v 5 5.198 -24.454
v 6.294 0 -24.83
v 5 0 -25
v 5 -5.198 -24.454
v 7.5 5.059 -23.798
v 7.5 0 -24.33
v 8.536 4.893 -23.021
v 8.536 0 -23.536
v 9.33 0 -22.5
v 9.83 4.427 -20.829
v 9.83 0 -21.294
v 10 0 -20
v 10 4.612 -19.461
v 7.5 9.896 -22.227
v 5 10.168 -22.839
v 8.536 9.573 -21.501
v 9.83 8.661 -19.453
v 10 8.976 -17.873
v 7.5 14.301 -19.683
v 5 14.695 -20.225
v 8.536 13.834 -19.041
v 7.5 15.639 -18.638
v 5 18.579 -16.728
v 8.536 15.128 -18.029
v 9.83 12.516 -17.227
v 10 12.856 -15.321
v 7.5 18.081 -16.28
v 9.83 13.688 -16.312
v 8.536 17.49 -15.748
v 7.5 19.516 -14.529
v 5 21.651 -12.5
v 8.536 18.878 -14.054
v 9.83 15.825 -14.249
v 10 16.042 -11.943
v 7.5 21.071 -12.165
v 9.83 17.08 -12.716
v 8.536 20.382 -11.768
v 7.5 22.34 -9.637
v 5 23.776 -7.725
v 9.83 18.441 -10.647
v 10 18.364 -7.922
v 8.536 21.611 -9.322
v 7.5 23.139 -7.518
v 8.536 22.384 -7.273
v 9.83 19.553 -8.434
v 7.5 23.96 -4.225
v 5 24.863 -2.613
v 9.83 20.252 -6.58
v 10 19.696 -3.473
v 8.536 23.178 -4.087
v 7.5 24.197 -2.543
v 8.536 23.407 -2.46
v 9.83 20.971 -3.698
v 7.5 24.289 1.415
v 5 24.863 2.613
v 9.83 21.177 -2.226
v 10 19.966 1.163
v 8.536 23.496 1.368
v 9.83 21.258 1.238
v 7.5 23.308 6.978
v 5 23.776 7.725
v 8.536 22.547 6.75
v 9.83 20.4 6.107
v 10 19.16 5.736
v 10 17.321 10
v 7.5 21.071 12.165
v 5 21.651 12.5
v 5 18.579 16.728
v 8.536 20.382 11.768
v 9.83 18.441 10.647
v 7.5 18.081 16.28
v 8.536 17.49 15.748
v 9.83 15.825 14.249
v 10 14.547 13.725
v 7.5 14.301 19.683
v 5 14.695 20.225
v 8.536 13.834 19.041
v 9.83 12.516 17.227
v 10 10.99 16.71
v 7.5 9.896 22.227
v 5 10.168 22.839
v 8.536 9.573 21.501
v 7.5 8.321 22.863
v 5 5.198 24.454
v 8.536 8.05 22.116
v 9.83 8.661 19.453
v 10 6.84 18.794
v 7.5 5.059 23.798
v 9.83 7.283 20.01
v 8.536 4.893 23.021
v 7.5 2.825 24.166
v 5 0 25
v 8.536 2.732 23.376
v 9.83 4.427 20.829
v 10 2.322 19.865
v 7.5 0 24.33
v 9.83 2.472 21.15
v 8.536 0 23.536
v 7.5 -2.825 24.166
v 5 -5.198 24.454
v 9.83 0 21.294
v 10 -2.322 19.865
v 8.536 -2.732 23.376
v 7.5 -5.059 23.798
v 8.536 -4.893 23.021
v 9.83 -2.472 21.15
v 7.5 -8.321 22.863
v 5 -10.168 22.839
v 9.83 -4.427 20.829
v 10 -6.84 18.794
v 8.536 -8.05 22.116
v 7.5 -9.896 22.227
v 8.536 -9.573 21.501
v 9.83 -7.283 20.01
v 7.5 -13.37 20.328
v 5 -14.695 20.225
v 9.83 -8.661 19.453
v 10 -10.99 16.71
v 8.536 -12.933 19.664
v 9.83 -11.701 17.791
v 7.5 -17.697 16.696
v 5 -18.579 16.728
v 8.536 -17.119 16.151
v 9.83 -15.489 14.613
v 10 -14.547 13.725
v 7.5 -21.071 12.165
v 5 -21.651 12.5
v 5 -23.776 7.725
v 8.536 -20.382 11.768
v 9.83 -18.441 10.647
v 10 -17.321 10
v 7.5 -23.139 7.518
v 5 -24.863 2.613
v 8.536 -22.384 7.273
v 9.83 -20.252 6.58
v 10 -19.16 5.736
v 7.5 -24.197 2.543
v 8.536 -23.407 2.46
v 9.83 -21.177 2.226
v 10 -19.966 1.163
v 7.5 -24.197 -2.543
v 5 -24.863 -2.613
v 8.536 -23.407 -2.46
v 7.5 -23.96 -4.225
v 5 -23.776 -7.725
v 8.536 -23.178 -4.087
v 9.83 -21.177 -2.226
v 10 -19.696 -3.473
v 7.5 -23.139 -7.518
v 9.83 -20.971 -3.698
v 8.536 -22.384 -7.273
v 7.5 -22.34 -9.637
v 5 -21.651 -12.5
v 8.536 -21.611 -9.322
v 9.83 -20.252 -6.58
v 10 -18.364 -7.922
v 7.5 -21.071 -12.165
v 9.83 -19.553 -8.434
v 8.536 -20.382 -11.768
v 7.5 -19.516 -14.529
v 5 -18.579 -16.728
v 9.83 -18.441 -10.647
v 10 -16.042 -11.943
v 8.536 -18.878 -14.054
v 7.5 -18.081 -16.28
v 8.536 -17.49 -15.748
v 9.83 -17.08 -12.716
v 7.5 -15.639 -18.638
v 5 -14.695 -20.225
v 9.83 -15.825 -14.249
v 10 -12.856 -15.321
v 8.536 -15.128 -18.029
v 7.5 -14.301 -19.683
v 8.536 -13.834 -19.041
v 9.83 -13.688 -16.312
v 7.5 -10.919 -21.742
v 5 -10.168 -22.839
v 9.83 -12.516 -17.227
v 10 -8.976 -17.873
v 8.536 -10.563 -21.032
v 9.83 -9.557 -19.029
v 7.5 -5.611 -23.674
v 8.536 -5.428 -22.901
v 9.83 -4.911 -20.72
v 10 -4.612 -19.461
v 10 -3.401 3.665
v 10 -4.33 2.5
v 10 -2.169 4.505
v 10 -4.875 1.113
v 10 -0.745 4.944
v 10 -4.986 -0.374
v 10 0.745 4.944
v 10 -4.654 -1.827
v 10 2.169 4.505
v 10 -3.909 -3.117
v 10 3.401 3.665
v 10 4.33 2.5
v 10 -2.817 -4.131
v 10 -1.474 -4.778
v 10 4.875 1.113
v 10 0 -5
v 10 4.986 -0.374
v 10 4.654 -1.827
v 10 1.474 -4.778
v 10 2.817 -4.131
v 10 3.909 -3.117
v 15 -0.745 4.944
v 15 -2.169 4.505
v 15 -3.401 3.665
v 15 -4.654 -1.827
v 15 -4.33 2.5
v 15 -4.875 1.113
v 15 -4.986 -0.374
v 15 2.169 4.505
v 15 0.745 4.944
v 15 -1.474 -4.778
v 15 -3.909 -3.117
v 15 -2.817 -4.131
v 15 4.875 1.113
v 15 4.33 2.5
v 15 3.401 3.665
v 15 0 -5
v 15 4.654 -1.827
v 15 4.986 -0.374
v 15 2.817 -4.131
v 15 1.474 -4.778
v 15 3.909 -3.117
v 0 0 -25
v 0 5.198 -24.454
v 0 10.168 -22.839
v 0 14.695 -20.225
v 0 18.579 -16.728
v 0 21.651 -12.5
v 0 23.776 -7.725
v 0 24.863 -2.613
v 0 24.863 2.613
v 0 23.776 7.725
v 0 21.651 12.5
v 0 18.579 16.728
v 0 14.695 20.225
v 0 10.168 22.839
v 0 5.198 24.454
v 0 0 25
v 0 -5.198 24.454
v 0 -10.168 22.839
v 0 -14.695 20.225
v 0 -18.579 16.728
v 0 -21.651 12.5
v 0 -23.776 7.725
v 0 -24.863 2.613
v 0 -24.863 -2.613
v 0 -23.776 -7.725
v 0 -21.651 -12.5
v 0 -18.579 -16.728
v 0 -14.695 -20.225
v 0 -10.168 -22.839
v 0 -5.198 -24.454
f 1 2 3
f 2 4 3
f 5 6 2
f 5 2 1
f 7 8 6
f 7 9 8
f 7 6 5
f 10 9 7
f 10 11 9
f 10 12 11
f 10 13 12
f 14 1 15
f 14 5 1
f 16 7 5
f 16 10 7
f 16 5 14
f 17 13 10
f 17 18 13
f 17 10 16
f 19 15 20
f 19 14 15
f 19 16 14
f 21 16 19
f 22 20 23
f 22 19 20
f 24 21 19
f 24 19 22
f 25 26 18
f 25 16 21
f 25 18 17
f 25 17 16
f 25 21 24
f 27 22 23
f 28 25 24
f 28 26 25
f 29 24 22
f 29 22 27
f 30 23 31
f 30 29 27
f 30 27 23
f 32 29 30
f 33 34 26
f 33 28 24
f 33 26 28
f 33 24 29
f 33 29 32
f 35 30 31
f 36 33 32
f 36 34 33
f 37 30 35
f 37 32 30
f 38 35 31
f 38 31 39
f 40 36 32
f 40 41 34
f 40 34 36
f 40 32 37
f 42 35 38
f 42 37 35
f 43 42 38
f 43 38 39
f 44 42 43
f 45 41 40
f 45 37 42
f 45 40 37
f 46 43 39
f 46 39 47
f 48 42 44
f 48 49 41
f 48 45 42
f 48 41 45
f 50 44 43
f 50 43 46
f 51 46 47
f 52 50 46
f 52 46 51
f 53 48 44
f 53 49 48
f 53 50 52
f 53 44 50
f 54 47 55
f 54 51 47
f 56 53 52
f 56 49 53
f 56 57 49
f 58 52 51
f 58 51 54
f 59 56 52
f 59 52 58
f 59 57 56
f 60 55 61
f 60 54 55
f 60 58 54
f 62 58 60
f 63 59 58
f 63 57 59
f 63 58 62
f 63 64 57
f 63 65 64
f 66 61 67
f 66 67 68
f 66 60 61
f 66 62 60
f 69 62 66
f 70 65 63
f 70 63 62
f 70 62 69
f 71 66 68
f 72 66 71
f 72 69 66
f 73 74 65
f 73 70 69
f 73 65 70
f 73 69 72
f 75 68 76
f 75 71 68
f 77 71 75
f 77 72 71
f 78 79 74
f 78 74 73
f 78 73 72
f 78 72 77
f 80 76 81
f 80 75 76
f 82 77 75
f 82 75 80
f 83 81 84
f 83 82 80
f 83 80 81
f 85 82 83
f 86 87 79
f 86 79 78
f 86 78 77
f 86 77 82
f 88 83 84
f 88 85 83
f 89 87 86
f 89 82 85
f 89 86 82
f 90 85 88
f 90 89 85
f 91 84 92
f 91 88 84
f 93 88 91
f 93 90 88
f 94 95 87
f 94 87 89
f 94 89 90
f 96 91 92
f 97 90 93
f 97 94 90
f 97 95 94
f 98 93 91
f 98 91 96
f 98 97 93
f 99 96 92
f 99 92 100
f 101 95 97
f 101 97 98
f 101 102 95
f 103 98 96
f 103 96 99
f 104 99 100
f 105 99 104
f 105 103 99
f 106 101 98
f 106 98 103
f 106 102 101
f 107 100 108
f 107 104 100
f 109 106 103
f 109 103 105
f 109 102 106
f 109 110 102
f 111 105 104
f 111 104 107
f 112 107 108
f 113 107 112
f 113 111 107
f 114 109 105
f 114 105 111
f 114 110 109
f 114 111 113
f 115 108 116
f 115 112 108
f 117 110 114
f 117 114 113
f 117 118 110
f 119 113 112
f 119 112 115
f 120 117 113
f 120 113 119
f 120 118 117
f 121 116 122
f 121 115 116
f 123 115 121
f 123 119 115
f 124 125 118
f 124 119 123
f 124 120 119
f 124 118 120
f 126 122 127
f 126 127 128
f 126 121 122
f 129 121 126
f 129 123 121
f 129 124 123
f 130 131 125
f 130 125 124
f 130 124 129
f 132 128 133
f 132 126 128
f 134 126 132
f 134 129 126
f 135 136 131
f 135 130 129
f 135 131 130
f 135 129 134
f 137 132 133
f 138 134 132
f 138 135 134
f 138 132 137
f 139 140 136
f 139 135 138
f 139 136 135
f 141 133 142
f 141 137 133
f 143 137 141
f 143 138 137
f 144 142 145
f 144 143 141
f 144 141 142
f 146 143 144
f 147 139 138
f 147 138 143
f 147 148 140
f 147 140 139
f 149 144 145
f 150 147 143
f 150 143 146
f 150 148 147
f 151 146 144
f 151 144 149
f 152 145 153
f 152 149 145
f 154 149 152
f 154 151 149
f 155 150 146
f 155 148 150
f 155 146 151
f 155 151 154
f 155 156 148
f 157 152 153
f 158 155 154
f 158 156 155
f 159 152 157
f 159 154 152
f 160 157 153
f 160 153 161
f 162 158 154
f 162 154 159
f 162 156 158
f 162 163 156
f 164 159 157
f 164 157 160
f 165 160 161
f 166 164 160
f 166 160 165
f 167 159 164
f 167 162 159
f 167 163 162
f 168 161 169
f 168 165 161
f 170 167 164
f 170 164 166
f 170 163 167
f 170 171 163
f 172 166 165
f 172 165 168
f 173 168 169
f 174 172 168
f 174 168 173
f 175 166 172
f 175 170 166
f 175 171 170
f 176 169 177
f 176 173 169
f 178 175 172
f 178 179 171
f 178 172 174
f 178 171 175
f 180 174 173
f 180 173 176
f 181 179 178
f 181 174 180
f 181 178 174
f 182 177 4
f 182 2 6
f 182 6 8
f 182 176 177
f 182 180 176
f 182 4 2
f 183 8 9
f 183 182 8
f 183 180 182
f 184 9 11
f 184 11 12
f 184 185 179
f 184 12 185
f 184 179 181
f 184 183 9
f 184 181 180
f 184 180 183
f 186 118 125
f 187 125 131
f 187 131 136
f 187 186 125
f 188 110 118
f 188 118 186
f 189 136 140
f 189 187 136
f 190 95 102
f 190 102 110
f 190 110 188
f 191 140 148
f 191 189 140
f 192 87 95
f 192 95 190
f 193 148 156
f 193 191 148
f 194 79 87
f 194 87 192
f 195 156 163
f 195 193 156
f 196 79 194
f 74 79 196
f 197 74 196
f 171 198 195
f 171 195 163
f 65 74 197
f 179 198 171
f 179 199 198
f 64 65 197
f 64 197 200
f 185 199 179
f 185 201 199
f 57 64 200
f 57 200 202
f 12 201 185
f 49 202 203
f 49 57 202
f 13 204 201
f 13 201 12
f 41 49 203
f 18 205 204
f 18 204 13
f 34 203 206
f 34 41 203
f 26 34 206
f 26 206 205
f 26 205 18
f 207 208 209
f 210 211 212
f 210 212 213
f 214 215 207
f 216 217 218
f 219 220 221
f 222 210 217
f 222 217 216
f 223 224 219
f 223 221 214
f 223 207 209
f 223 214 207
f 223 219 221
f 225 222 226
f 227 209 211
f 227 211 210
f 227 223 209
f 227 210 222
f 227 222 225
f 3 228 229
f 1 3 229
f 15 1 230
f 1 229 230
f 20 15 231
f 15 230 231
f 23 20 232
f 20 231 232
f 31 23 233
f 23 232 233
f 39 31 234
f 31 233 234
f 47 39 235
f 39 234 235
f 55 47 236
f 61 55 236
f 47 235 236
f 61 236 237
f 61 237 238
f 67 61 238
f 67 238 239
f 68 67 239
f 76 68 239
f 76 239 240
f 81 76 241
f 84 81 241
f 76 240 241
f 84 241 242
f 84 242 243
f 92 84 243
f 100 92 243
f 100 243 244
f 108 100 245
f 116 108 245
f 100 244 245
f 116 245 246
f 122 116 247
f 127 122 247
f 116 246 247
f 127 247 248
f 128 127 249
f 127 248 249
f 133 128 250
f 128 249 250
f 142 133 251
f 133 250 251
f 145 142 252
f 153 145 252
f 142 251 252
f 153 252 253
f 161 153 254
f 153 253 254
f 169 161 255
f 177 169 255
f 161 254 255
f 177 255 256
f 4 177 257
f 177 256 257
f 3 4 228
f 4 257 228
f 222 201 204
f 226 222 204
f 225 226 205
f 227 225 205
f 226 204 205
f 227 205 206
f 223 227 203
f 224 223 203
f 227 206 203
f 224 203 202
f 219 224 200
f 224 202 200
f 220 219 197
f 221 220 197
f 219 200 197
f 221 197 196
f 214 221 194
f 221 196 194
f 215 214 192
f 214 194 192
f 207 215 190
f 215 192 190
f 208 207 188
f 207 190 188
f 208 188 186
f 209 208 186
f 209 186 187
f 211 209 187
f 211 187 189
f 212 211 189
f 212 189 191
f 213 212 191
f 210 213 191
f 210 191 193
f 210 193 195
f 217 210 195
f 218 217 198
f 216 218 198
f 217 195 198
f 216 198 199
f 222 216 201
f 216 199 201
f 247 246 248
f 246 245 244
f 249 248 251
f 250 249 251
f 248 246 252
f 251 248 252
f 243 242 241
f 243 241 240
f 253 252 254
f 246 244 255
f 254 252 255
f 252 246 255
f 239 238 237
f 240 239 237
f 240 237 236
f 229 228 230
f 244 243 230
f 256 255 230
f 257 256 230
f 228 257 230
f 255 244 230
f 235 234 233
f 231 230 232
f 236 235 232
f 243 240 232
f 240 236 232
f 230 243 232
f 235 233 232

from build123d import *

# Parameters (mm, degrees)
SKETCH1_R           = 25
BOSS_EXTRUDE1_DEPTH = 10
FILLET1_R           = 5
SKETCH2_R           = 5
BOSS_EXTRUDE2_DEPTH = 5


with BuildPart() as part:
    # Sketch1 → Boss-Extrude1 (new body)
    with BuildSketch(Plane(origin=(0, 0, 0), x_dir=(0, 0, -1), z_dir=(1, 0, 0))):
        Circle(SKETCH1_R)
    extrude(amount=BOSS_EXTRUDE1_DEPTH)

    # Fillet1
    fillet1_edges = [part.edges().sort_by_distance(p)[0] for p in [
        (10, 0, 25),
    ]]
    fillet(fillet1_edges, radius=FILLET1_R)

    # Sketch2 → Boss-Extrude2 (add)
    with BuildSketch(Plane(origin=(10, 0, 0), x_dir=(0, 0, -1), z_dir=(1, 0, 0))):
        Circle(SKETCH2_R)
    extrude(amount=BOSS_EXTRUDE2_DEPTH)


solid = part.part
